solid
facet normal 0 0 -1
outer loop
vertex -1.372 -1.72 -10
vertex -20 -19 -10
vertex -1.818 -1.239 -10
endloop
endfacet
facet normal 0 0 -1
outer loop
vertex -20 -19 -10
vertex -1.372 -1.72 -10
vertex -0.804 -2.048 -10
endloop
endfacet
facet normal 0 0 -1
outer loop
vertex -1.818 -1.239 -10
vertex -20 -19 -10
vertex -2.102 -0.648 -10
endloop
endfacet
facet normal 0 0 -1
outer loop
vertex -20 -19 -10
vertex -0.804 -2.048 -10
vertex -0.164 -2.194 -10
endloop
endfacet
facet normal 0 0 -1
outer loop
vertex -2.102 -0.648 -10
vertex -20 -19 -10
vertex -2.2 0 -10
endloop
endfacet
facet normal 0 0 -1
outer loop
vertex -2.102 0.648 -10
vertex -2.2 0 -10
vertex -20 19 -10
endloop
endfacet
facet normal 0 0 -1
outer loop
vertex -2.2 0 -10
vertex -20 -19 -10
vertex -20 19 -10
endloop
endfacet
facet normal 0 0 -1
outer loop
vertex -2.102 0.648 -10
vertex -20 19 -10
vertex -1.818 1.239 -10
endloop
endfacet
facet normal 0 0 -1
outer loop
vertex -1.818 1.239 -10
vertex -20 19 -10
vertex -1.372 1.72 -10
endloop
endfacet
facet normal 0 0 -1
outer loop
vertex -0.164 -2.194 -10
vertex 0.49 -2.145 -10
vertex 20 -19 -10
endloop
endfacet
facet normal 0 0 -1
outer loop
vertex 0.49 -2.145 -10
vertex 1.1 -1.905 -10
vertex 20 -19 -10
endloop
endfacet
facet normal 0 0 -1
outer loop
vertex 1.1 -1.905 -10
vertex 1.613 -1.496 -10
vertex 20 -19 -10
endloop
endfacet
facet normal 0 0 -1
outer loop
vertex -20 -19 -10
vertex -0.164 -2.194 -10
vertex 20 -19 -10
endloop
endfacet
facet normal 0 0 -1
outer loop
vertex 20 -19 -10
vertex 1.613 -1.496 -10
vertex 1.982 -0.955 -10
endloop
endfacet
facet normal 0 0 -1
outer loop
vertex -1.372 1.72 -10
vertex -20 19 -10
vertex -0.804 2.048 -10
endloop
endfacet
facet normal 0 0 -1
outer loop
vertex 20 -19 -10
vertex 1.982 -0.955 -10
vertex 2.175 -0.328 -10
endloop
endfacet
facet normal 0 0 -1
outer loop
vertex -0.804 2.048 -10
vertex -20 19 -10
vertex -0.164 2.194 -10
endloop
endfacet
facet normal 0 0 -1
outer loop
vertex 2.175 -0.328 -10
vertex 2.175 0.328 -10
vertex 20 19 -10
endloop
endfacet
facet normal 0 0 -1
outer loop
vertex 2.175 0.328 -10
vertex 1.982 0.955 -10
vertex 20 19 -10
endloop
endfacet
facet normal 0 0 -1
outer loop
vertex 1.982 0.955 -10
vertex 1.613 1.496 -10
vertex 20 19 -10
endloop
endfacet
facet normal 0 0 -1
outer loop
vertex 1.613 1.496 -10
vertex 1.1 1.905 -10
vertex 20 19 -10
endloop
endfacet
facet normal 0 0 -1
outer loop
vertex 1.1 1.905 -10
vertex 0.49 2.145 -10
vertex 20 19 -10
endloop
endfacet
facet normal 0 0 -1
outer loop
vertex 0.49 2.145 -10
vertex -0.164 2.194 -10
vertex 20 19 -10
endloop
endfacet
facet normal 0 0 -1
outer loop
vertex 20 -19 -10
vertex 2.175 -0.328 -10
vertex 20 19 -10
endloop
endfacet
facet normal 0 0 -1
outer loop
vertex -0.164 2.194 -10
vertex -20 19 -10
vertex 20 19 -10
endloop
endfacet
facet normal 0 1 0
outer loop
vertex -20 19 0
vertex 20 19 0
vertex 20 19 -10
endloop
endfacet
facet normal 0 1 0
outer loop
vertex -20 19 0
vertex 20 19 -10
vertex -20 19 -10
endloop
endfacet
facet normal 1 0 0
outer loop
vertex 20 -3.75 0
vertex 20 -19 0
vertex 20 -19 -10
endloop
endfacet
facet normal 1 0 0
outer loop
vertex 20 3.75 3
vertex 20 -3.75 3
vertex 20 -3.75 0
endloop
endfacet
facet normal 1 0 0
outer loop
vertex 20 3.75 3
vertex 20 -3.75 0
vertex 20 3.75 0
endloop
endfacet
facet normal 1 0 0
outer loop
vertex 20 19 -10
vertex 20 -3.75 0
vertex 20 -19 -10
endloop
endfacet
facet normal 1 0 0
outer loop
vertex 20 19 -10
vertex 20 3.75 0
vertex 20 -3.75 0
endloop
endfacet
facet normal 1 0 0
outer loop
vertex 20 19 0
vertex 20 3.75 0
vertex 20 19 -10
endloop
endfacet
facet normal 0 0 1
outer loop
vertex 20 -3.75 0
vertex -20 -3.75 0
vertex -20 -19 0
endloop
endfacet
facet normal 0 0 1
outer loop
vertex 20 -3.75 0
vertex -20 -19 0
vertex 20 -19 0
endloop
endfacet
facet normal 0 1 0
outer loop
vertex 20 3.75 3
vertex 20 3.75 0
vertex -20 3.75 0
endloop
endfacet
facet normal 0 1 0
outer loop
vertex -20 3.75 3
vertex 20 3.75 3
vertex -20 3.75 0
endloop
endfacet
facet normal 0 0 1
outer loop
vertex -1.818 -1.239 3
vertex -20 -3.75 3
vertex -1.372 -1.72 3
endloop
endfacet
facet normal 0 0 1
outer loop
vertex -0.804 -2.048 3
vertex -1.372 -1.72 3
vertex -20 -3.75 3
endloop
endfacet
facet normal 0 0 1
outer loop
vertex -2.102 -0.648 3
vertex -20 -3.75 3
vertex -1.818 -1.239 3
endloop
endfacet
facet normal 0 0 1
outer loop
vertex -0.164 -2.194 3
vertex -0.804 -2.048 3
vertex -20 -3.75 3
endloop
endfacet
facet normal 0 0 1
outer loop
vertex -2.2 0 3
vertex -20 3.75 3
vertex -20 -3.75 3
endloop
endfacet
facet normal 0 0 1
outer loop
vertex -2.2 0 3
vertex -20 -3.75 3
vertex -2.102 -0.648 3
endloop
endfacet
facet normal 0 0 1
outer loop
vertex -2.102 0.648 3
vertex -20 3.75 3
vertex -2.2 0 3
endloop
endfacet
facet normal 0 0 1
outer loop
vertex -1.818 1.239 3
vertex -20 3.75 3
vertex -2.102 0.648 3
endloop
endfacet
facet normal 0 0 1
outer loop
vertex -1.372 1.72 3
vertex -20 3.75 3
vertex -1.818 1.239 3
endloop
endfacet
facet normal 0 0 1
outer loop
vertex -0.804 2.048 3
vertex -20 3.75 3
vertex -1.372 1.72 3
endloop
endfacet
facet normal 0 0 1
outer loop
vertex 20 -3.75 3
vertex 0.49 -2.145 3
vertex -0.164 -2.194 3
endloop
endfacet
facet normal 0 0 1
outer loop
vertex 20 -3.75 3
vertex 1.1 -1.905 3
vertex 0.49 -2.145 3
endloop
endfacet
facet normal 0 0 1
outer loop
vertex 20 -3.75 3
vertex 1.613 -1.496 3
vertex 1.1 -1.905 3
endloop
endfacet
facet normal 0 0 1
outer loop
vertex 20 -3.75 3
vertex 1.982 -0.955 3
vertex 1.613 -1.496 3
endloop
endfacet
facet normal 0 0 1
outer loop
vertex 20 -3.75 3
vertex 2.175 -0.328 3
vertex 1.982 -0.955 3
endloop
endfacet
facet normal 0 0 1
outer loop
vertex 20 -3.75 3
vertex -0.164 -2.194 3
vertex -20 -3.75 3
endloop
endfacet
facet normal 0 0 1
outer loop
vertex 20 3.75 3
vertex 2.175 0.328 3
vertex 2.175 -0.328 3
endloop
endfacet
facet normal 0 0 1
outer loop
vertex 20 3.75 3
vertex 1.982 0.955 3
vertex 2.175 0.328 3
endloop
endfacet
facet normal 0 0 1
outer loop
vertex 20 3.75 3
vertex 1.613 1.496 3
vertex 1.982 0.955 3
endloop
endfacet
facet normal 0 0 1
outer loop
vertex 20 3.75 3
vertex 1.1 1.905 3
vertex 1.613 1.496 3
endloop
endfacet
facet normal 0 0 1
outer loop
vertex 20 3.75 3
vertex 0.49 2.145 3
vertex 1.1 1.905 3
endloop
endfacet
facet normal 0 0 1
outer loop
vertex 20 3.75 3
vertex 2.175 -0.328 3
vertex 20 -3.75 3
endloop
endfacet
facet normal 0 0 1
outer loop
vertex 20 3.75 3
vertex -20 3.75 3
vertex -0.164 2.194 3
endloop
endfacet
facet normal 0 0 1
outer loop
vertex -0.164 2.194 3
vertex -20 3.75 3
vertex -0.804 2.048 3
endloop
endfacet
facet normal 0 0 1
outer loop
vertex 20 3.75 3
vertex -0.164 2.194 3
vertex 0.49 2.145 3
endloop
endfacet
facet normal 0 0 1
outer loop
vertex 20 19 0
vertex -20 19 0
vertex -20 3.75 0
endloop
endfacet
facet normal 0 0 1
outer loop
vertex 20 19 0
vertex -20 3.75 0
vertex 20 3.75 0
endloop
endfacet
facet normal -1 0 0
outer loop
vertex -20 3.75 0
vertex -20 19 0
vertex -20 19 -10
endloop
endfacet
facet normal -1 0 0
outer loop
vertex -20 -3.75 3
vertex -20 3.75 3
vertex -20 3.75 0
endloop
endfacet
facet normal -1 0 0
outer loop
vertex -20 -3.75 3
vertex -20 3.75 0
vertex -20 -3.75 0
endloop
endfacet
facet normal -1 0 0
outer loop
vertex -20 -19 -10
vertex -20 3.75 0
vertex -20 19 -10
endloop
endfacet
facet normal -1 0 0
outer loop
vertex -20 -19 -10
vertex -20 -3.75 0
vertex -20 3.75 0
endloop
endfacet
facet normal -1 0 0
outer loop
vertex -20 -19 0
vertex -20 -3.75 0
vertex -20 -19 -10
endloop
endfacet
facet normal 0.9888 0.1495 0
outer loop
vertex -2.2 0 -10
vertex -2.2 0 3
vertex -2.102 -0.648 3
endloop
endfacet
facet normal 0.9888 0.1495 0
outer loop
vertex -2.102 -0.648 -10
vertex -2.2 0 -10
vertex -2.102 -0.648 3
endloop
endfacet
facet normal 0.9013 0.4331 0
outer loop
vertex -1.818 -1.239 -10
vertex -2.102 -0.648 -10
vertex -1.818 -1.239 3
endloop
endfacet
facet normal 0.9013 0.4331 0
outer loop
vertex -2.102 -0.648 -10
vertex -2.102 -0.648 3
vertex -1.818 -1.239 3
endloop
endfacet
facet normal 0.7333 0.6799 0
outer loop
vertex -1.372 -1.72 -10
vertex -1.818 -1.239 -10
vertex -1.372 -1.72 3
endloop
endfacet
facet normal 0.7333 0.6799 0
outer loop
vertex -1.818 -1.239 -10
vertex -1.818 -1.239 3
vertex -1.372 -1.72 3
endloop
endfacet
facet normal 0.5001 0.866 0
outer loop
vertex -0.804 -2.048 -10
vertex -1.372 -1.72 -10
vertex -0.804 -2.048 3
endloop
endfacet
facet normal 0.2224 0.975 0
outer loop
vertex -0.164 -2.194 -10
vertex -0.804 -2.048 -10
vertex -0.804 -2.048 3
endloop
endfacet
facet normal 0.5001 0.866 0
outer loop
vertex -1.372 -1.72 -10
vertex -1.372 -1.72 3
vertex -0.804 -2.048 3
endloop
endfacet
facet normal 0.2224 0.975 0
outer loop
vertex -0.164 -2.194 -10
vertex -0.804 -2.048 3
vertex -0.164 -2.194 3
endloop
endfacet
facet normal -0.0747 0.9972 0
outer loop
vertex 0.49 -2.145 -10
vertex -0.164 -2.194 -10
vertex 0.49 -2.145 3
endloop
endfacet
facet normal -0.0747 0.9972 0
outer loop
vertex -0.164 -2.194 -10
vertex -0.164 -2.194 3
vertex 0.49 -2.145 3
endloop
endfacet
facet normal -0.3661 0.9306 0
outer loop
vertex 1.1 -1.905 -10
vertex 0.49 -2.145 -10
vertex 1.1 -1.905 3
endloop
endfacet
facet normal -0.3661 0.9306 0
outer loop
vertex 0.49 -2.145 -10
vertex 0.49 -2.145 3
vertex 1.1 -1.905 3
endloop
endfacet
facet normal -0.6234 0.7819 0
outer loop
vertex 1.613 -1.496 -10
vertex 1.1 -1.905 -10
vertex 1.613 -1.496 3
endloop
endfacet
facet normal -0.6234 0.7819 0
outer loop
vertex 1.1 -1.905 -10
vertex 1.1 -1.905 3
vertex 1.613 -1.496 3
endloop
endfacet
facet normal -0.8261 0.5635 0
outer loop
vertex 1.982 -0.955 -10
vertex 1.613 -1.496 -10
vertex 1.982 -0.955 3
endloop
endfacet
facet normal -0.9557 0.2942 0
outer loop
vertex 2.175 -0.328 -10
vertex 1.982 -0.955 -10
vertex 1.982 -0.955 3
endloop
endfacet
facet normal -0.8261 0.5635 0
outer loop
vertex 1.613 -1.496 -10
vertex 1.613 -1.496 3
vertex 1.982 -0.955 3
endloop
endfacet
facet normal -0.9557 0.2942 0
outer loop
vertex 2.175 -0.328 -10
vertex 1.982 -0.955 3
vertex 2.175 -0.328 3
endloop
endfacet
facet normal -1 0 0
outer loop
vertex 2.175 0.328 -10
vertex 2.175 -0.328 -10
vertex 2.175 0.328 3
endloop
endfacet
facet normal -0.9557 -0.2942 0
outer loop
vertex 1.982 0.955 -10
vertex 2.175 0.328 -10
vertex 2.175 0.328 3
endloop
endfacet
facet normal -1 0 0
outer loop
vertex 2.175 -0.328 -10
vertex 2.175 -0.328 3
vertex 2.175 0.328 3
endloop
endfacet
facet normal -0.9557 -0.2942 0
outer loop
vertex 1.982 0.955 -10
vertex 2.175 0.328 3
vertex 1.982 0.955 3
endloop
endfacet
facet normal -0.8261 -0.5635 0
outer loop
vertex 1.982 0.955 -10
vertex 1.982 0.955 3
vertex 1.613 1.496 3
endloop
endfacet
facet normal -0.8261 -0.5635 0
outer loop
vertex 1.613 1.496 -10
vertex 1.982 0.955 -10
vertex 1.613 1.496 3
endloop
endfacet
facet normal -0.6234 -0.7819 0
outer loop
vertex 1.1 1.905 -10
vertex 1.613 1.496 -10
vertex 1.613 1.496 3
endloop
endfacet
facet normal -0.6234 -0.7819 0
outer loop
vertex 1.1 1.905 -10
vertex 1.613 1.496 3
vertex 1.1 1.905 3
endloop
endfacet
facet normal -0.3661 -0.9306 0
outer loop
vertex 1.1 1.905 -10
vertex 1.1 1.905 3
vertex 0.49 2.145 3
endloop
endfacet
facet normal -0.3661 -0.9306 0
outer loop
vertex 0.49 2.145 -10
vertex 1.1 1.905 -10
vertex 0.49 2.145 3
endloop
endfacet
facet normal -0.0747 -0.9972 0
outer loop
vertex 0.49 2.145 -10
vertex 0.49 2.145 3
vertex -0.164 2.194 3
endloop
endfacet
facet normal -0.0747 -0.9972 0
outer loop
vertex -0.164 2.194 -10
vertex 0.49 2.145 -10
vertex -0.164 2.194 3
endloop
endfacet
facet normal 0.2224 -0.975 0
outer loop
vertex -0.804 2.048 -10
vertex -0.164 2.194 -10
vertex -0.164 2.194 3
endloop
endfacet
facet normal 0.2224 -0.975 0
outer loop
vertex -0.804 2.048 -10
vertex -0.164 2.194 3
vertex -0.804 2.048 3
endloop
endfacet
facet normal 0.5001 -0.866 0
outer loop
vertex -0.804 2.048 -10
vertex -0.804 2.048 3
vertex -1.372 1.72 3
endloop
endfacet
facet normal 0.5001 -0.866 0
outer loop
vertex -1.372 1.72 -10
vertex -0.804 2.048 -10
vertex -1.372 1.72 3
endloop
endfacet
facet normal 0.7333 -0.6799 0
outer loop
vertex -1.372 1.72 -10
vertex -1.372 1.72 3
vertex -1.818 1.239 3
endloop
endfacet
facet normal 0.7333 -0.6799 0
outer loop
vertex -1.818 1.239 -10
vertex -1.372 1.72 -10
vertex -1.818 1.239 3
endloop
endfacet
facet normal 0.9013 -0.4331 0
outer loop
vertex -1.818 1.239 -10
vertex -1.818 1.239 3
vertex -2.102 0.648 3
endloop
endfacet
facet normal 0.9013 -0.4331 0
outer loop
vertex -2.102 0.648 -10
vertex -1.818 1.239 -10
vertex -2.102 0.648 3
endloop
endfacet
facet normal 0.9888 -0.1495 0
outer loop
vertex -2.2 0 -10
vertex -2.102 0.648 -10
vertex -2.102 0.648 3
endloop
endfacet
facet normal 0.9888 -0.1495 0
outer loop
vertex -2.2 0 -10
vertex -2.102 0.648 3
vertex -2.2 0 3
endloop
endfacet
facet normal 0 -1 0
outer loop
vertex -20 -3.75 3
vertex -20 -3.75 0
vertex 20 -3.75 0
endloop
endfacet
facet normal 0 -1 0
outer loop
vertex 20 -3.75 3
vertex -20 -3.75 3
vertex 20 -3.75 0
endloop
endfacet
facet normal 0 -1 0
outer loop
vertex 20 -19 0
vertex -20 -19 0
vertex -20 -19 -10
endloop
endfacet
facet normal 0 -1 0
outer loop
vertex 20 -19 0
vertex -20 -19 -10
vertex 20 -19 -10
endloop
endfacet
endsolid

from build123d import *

# Parameters (mm, degrees)
F0_W     = 20
F0_H     = 15.25
F0_H_2   = 7.5
F1_DEPTH = 10
F2_DEPTH = 3
F4_D     = 4.4
F4_DEPTH = 20
F4_TIP   = 1.3218933619


with BuildPart() as f1:
    # F0 (on Top) → F1 (new body)
    with BuildSketch(Plane.XY):
        with Locations((10, 11.375)):
            Rectangle(F0_W, F0_H)
        with Locations((-10, 11.375)):
            Rectangle(F0_W, F0_H)
        with Locations((10, -11.375)):
            Rectangle(F0_W, F0_H)
        with Locations((-10, -11.375)):
            Rectangle(F0_W, F0_H)
        with Locations((10, 0)):
            Rectangle(F0_W, F0_H_2)
        with Locations((-10, 0)):
            Rectangle(F0_W, F0_H_2)
    extrude(amount=-F1_DEPTH)

    # F0 (on Top) → F2 (join)
    with BuildSketch(Plane.XY):
        with Locations((10, 0)):
            Rectangle(F0_W, F0_H_2)
        with Locations((-10, 0)):
            Rectangle(F0_W, F0_H_2)
    extrude(amount=F2_DEPTH)

    # F4
    with Locations(Plane(origin=(0, 0, -10), x_dir=(1, 0, 0), z_dir=(0, 0, -1))):
        with Locations((0, 0)):
            Hole(F4_D / 2, depth=F4_DEPTH)
            with Locations((0, 0, -(F4_DEPTH + F4_TIP / 2))):  # 118° drill point
                Cone(0, F4_D / 2, F4_TIP, mode=Mode.SUBTRACT)


solid = f1.part
